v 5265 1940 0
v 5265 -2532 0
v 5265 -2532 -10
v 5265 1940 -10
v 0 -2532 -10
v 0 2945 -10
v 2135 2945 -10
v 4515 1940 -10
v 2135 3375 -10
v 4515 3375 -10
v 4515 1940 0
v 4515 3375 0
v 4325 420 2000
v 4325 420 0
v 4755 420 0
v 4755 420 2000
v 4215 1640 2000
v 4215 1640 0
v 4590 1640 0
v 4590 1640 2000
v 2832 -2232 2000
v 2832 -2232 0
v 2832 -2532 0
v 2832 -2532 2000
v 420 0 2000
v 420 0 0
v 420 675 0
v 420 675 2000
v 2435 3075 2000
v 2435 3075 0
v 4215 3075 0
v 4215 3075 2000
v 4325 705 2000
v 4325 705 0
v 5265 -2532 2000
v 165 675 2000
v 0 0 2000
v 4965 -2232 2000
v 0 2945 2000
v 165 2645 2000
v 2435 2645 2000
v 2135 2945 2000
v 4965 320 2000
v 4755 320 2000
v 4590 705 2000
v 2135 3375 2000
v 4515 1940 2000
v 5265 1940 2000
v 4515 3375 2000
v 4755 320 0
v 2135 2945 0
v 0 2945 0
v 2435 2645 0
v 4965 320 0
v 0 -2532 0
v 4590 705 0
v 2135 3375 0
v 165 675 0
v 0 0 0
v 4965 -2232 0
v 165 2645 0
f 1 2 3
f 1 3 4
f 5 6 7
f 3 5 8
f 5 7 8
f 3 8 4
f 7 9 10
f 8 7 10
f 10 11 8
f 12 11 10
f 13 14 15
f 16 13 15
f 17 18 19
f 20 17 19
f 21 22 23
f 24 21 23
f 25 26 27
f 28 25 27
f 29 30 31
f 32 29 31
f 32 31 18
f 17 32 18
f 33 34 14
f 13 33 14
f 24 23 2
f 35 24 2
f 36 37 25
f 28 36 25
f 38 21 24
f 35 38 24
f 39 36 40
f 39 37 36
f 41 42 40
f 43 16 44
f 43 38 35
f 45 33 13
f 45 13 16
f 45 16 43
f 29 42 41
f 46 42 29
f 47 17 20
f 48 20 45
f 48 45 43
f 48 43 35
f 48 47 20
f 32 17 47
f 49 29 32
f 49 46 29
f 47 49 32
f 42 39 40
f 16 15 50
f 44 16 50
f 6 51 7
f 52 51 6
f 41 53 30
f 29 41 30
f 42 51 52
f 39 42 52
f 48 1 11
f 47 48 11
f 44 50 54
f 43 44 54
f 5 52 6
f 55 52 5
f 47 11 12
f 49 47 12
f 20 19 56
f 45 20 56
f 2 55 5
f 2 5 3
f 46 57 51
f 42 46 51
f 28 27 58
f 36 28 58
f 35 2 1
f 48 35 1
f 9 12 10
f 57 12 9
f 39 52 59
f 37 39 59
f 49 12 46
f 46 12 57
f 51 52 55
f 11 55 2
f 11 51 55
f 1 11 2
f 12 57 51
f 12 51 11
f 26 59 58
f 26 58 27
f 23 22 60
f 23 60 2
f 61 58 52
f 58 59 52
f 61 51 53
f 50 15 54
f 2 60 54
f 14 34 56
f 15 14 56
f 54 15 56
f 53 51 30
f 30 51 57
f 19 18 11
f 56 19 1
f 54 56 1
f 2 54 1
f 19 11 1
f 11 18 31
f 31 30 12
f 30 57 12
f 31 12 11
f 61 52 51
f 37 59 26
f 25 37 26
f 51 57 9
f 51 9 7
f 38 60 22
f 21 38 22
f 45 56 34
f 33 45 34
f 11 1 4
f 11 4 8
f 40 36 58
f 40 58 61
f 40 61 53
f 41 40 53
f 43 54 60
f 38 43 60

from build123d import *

# Parameters (mm, degrees)
F1_DEPTH = 2000
F2_DEPTH = 10


with BuildPart() as f1:
    # F0 (on Top) → F1 (new body)
    with BuildSketch(Plane.XY):
        Polygon((0, 2945), (0, 0), (420, 0), (420, 675), (165, 675), (165, 2645), (2435, 2645), (2435, 3075), (4215, 3075), (4215, 1640), (4590, 1640), (4590, 705), (4325, 705), (4325, 420), (4755, 420), (4755, 320), (4965, 320), (4965, -2232), (2832, -2232), (2832, -2532), (5265, -2532), (5265, 1940), (4515, 1940), (4515, 3375), (2135, 3375), (2135, 2945), align=None)
    extrude(amount=F1_DEPTH)


with BuildPart() as f2:
    # F0 (on Top) → F2 (new body)
    with BuildSketch(Plane.XY):
        Polygon((0, 2945), (0, 0), (420, 0), (420, 675), (165, 675), (165, 2645), (2435, 2645), (2435, 3075), (4215, 3075), (4215, 1640), (4590, 1640), (4590, 705), (4325, 705), (4325, 420), (4755, 420), (4755, 320), (4965, 320), (4965, -2232), (2832, -2232), (2832, -2532), (5265, -2532), (5265, 1940), (4515, 1940), (4515, 3375), (2135, 3375), (2135, 2945), align=None)
        Polygon((420, 0), (0, 0), (0, -2532), (2832, -2532), (2832, -2232), (4965, -2232), (4965, 320), (4755, 320), (4755, 420), (4325, 420), (4325, 705), (4590, 705), (4590, 1640), (4215, 1640), (4215, 3075), (2435, 3075), (2435, 2645), (165, 2645), (165, 675), (420, 675), align=None)
    extrude(amount=-F2_DEPTH)


solid = Compound([f1.part, f2.part])
